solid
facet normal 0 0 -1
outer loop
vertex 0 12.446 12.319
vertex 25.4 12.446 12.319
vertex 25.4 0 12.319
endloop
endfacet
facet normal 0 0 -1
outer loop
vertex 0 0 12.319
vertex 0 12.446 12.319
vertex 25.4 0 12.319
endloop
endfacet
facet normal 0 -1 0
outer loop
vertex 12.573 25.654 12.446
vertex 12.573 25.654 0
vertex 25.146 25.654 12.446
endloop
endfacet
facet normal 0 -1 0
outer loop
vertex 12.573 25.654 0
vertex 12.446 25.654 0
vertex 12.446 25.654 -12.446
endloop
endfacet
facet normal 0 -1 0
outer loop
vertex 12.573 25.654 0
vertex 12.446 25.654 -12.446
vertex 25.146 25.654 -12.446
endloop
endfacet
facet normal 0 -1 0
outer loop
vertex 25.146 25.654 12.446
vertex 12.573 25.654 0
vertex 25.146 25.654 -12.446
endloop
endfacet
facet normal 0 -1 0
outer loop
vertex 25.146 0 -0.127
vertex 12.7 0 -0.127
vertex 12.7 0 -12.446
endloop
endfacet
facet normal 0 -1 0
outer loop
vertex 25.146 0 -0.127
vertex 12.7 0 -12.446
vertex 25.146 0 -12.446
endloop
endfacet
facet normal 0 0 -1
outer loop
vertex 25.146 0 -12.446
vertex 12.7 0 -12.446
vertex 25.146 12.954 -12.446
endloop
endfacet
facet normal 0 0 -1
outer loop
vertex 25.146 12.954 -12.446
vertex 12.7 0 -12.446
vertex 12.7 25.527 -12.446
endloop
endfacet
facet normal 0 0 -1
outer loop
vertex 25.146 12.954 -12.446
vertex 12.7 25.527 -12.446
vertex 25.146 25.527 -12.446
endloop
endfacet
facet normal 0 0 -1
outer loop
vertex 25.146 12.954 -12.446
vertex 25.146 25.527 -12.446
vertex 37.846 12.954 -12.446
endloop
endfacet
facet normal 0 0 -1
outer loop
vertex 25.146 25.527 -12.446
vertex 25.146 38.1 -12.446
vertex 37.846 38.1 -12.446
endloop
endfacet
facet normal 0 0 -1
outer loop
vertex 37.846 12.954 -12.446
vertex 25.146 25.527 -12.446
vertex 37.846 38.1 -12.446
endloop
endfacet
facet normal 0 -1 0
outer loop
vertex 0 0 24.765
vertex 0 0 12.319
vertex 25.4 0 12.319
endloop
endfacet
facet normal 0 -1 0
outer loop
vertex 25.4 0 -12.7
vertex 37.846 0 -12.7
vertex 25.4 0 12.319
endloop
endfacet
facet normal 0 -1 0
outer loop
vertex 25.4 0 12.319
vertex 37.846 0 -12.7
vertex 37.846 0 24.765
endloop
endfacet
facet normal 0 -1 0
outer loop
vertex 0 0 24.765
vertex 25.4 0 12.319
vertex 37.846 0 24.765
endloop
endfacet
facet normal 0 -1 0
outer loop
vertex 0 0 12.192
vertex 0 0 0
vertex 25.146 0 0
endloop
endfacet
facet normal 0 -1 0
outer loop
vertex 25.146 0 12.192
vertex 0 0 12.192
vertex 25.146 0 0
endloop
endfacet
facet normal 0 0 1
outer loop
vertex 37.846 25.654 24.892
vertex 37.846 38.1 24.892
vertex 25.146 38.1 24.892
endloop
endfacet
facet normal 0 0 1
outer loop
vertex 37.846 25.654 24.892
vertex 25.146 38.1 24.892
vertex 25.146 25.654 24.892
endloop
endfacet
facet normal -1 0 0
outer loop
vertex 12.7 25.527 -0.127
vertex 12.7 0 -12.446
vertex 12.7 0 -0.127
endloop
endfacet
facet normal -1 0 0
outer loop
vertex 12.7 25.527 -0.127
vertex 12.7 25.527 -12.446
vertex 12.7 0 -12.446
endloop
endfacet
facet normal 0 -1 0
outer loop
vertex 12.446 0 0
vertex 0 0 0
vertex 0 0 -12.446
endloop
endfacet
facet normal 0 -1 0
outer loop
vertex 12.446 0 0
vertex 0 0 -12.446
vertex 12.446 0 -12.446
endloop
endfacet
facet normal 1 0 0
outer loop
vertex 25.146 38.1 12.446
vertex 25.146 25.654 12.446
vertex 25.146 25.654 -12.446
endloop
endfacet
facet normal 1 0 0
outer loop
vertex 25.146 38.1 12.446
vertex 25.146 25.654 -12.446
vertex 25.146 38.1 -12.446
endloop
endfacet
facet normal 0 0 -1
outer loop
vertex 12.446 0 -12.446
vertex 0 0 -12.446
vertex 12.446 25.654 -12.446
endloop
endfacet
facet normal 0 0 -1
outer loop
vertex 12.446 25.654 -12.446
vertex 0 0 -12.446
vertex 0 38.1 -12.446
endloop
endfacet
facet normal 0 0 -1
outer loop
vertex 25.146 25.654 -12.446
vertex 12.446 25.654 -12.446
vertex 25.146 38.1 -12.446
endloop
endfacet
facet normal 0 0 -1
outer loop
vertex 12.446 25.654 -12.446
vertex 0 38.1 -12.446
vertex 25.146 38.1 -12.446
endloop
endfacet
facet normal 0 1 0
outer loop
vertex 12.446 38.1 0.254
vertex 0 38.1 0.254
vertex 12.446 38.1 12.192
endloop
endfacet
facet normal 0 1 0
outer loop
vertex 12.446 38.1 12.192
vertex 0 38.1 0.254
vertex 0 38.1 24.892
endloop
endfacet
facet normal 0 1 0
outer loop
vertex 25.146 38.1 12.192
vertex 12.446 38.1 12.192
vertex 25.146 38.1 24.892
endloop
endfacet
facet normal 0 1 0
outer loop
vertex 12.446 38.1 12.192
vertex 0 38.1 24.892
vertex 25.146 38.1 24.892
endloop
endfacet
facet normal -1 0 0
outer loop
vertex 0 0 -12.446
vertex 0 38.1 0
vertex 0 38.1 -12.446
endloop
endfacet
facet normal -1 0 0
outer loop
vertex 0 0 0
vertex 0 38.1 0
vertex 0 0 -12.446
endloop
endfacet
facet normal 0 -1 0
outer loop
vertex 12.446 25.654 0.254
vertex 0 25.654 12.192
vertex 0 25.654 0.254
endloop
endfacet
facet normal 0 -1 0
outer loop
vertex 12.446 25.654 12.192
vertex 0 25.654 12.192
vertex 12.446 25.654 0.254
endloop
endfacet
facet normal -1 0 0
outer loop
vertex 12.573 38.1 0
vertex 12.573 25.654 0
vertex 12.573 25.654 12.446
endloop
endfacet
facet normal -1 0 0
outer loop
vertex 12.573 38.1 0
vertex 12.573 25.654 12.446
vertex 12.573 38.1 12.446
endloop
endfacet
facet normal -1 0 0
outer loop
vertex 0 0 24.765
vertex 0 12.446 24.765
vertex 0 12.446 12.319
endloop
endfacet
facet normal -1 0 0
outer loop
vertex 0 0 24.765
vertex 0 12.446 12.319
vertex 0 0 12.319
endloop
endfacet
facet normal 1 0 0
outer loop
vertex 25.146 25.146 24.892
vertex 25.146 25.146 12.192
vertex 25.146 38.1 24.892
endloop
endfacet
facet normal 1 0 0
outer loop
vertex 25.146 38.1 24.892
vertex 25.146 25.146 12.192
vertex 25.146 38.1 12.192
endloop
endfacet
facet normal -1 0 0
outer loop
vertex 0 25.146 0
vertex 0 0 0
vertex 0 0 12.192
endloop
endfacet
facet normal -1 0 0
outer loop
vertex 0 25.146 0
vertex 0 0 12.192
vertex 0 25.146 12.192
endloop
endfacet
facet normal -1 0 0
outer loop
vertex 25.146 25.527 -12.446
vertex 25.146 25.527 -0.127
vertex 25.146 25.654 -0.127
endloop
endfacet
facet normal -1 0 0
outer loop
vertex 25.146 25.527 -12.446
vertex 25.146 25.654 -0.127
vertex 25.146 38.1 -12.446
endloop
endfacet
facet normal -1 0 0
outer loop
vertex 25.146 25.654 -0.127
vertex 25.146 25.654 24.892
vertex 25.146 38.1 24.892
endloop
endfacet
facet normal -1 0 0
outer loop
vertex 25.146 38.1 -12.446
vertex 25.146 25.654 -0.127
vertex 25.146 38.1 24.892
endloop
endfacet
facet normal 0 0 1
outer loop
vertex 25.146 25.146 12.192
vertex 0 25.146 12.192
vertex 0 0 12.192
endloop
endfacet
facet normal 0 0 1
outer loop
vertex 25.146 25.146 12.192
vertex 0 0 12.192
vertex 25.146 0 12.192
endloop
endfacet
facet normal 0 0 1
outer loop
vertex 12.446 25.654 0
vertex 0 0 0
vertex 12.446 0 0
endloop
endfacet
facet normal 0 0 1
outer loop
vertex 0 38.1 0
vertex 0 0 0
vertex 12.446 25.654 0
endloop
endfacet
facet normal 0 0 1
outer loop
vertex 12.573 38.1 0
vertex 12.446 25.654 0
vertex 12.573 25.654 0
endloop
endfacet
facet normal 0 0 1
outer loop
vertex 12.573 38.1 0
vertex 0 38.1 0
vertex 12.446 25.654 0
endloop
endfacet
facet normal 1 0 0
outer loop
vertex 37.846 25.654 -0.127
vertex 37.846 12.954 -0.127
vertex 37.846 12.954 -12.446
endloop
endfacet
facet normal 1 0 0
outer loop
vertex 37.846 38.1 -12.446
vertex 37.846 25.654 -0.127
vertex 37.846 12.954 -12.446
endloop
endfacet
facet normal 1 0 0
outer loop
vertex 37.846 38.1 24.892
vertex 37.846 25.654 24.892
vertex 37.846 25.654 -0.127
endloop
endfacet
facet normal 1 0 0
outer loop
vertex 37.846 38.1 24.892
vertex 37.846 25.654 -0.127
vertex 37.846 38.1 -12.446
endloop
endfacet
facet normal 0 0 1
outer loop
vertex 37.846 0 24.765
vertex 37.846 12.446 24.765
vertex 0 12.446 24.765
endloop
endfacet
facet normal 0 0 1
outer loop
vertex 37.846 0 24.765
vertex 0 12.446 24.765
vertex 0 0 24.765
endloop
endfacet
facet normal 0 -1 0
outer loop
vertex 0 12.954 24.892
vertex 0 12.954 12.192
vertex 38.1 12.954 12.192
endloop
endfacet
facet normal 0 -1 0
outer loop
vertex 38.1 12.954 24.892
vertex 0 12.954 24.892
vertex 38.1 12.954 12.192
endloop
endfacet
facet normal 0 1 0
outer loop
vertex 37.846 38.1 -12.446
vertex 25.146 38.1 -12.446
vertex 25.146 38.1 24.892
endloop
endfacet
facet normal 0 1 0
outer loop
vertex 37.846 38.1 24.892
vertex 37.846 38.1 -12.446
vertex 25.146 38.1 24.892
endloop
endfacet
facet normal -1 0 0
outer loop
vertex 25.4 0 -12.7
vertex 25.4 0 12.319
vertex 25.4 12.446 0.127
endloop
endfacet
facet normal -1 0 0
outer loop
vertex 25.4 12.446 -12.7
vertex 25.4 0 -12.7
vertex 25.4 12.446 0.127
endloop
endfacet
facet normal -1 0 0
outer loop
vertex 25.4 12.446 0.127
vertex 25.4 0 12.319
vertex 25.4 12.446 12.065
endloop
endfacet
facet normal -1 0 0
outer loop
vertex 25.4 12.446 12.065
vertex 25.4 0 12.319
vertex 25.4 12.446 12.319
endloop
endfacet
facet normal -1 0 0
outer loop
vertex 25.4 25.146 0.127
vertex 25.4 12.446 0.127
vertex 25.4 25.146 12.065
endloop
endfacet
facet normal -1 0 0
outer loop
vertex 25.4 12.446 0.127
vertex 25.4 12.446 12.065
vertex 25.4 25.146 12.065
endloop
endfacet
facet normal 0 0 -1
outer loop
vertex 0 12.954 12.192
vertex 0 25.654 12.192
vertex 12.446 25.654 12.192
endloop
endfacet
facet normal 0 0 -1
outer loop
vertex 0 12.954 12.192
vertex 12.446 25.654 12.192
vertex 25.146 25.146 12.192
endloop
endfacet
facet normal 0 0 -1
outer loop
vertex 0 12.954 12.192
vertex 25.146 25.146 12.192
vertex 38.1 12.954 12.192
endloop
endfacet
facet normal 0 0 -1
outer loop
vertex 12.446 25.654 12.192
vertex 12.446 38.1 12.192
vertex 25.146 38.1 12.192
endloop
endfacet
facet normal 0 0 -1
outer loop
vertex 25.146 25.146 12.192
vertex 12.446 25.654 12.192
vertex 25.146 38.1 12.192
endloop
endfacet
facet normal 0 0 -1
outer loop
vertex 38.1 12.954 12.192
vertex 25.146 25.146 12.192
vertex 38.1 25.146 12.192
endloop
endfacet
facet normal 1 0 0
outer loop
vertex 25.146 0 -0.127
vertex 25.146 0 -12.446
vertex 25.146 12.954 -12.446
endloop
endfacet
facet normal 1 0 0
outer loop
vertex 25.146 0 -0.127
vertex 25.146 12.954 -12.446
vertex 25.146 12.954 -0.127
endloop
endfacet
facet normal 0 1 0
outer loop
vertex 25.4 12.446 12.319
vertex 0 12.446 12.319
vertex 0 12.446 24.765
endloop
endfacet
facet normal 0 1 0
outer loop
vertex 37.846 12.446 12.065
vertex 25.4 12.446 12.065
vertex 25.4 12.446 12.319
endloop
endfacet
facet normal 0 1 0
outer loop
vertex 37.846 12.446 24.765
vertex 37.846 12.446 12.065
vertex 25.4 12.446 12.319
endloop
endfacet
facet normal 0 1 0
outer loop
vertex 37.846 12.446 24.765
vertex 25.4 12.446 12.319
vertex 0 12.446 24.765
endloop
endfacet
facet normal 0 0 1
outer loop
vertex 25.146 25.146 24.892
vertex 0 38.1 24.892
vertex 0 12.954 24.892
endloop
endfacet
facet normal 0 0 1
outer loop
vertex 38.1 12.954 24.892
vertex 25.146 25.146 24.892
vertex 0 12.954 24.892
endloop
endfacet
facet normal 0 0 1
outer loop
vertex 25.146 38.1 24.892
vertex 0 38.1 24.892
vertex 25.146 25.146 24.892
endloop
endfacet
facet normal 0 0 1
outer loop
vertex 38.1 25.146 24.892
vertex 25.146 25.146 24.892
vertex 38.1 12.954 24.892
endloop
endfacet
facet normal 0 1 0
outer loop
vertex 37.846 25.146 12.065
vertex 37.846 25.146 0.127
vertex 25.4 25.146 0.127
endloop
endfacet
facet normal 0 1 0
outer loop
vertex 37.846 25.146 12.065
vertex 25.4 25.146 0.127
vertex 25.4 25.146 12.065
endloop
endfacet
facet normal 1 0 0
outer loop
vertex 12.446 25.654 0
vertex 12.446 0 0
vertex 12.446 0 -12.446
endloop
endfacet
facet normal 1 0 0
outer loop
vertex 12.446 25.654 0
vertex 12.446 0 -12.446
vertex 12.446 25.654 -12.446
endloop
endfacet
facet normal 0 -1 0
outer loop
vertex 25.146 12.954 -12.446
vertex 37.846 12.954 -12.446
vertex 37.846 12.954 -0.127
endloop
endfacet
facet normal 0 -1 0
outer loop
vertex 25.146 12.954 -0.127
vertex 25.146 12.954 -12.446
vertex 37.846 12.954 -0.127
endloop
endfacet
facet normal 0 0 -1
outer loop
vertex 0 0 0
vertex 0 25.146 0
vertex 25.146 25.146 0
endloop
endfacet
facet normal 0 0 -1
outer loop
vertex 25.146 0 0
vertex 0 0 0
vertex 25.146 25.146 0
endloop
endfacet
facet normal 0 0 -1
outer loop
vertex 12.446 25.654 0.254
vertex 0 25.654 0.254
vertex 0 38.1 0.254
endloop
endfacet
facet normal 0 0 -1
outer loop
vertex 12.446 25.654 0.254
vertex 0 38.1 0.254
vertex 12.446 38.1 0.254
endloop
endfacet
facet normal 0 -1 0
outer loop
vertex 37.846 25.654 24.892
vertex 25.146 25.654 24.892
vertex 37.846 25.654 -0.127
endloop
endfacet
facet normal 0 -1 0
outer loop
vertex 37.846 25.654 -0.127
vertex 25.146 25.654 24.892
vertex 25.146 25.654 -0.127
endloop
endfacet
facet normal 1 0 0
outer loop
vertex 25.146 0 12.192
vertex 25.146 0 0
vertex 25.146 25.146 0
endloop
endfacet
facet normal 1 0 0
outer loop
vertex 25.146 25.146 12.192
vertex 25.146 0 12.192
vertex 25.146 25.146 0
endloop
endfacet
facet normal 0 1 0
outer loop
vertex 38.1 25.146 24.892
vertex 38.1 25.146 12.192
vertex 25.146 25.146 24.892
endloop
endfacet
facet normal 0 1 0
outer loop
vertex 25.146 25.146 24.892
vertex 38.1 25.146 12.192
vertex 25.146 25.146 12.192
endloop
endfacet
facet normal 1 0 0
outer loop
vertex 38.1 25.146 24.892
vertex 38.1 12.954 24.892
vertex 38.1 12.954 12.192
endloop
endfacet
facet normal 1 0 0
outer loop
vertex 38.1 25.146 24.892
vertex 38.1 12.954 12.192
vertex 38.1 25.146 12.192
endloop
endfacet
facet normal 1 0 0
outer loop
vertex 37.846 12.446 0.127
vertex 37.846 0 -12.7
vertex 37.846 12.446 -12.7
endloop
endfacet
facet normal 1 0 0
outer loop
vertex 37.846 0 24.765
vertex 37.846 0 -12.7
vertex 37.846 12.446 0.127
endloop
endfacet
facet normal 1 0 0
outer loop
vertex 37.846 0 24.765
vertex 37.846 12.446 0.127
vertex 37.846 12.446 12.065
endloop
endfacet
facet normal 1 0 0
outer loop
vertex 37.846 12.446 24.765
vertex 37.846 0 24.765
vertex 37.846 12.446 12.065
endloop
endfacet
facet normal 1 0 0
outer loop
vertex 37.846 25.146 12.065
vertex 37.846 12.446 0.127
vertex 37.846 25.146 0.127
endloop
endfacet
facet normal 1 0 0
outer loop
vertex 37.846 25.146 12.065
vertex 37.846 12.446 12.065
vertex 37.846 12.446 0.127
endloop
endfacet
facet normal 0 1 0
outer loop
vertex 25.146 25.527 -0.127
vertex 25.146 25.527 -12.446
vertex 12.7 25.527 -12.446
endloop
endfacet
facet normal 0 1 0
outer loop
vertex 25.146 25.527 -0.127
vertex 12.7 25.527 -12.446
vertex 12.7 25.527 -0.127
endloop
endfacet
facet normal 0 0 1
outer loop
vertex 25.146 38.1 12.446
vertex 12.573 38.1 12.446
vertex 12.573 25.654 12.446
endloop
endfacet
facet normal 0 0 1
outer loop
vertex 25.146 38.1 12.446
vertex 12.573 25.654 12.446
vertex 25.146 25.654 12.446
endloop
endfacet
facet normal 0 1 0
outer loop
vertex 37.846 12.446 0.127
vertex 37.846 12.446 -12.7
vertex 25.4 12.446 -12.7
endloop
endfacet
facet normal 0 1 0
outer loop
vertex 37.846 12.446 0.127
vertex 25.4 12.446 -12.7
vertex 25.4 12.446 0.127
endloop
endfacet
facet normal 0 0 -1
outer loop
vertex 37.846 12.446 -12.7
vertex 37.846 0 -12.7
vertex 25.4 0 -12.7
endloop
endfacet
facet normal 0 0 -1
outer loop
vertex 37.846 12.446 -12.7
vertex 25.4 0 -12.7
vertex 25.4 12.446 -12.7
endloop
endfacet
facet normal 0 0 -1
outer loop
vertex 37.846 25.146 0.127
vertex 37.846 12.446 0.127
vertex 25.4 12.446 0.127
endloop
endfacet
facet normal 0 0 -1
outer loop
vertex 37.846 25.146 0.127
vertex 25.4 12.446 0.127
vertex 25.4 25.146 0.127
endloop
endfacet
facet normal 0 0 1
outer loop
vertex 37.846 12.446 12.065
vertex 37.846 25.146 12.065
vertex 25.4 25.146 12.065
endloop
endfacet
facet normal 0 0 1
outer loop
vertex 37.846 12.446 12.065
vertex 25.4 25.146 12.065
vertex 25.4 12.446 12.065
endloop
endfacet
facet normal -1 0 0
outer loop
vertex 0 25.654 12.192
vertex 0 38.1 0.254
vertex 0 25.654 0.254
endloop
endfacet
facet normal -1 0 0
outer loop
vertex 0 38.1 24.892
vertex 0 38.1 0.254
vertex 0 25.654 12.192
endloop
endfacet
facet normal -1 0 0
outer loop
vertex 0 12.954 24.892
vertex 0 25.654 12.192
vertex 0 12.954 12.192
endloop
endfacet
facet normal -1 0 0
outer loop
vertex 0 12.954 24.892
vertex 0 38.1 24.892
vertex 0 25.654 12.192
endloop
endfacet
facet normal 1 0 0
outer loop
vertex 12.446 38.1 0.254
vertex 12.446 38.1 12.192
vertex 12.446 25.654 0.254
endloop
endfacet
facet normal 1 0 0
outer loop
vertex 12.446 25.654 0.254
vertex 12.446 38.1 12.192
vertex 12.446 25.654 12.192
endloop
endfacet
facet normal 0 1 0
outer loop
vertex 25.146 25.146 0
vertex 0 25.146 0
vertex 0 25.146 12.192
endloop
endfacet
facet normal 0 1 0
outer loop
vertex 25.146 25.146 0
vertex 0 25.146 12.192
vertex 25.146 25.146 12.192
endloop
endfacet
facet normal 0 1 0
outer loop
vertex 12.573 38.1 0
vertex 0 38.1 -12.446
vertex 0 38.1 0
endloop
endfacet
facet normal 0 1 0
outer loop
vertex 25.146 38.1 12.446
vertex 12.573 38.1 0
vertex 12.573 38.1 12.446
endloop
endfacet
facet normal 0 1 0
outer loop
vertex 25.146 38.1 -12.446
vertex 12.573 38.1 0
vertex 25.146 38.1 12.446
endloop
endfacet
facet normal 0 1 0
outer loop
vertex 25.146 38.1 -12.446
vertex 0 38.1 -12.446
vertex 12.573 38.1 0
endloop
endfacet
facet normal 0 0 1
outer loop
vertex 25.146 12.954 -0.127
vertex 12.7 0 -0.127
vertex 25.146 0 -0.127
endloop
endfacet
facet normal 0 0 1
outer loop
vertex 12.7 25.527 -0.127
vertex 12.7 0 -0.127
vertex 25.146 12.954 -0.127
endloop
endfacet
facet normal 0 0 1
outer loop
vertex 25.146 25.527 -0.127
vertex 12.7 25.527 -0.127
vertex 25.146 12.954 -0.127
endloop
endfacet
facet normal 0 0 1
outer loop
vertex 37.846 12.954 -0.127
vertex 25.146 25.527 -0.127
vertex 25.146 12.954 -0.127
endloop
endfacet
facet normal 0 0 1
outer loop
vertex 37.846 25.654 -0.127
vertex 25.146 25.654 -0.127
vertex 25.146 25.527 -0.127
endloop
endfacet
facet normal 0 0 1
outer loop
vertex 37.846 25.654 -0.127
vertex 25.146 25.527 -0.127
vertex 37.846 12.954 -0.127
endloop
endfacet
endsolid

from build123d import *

# Parameters (mm, degrees)
F0_W      = 25.146
F0_H      = 25.146
F1_DEPTH  = 12.192
F3_DEPTH  = 12.446
F4_W      = 12.573
F4_H      = 12.446
F5_DEPTH  = 12.446
F7_DEPTH  = 12.7
F8_W      = 12.446
F8_H      = 12.446
F9_DEPTH  = 11.938
F11_DEPTH = 12.7
F12_W     = 12.573
F12_H     = 12.319
F13_DEPTH = 25.146
F14_W     = 12.446
F14_H     = 12.319
F15_DEPTH = 12.954
F17_DEPTH = 12.446
F18_W     = 12.446
F18_H     = 12.446
F19_DEPTH = 25.4


with BuildPart() as f1:
    # F0 (on Top) → F1 (new body)
    with BuildSketch(Plane.XY):
        with Locations((12.573, 12.573)):
            Rectangle(F0_W, F0_H)
    extrude(amount=F1_DEPTH)


with BuildPart() as f3:
    # F2 (on Top) → F3 (new body)
    with BuildSketch(Plane.XY):
        Polygon((0, 38.1), (0, 0), (12.446, 0), (12.446, 25.654), (25.146, 25.654), (25.146, 38.1), align=None)
    extrude(amount=-F3_DEPTH)

    # F4 (on face) → F5 (join)
    with BuildSketch(Plane.XY):
        with Locations((18.8595, 31.877)):
            Rectangle(F4_W, F4_H)
    extrude(amount=F5_DEPTH)


with BuildPart() as f7:
    # F6 (on face) → F7 (new body)
    with BuildSketch(Plane.XY.offset(12.192)):
        Polygon((25.146, 38.1), (0, 38.1), (0, 25.146), (0, 12.954), (12.954, 12.954), (38.1, 12.954), (38.1, 25.146), (25.146, 25.146), align=None)
    extrude(amount=F7_DEPTH)

    # F8 (on face) → F9 (join)
    with BuildSketch(Plane(origin=(0, 0, 12.192), x_dir=(1, 0, 0), z_dir=(0, 0, -1))):
        with Locations((6.223, -31.877)):
            Rectangle(F8_W, F8_H)
    extrude(amount=F9_DEPTH)


with BuildPart() as f11:
    # F10 (on face) → F11 (new body)
    with BuildSketch(Plane.YZ.offset(25.146)):
        Polygon((12.954, -12.446), (38.1, -12.446), (38.1, 24.892), (25.654, 24.892), (25.654, -0.127), (12.954, -0.127), align=None)
    extrude(amount=F11_DEPTH)

    # F12 (on face) → F13 (join)
    with BuildSketch(Plane.YZ.offset(37.846)):
        with Locations((19.2405, -6.2865)):
            Rectangle(F12_W, F12_H)
    extrude(amount=-F13_DEPTH)

    # F14 (on face) → F15 (join)
    with BuildSketch(Plane.XZ.offset(-12.954)):
        with Locations((18.923, -6.2865)):
            Rectangle(F14_W, F14_H)
    extrude(amount=F15_DEPTH)


with BuildPart() as f17:
    # F16 (on face) → F17 (new body)
    with BuildSketch(Plane.YZ.offset(37.846)):
        Polygon((0, 24.765), (0, -12.7), (12.446, -12.7), (12.446, 0.127), (25.146, 0.127), (25.146, 12.065), (12.446, 12.065), (12.446, 24.765), align=None)
    extrude(amount=-F17_DEPTH)

    # F18 (on face) → F19 (join)
    with BuildSketch(Plane(origin=(25.4, 0, 0), x_dir=(0, -1, 0), z_dir=(-1, 0, 0))):
        with Locations((-6.223, 18.542)):
            Rectangle(F18_W, F18_H)
    extrude(amount=F19_DEPTH)


solid = Compound([f1.part, f3.part, f7.part, f11.part, f17.part])
